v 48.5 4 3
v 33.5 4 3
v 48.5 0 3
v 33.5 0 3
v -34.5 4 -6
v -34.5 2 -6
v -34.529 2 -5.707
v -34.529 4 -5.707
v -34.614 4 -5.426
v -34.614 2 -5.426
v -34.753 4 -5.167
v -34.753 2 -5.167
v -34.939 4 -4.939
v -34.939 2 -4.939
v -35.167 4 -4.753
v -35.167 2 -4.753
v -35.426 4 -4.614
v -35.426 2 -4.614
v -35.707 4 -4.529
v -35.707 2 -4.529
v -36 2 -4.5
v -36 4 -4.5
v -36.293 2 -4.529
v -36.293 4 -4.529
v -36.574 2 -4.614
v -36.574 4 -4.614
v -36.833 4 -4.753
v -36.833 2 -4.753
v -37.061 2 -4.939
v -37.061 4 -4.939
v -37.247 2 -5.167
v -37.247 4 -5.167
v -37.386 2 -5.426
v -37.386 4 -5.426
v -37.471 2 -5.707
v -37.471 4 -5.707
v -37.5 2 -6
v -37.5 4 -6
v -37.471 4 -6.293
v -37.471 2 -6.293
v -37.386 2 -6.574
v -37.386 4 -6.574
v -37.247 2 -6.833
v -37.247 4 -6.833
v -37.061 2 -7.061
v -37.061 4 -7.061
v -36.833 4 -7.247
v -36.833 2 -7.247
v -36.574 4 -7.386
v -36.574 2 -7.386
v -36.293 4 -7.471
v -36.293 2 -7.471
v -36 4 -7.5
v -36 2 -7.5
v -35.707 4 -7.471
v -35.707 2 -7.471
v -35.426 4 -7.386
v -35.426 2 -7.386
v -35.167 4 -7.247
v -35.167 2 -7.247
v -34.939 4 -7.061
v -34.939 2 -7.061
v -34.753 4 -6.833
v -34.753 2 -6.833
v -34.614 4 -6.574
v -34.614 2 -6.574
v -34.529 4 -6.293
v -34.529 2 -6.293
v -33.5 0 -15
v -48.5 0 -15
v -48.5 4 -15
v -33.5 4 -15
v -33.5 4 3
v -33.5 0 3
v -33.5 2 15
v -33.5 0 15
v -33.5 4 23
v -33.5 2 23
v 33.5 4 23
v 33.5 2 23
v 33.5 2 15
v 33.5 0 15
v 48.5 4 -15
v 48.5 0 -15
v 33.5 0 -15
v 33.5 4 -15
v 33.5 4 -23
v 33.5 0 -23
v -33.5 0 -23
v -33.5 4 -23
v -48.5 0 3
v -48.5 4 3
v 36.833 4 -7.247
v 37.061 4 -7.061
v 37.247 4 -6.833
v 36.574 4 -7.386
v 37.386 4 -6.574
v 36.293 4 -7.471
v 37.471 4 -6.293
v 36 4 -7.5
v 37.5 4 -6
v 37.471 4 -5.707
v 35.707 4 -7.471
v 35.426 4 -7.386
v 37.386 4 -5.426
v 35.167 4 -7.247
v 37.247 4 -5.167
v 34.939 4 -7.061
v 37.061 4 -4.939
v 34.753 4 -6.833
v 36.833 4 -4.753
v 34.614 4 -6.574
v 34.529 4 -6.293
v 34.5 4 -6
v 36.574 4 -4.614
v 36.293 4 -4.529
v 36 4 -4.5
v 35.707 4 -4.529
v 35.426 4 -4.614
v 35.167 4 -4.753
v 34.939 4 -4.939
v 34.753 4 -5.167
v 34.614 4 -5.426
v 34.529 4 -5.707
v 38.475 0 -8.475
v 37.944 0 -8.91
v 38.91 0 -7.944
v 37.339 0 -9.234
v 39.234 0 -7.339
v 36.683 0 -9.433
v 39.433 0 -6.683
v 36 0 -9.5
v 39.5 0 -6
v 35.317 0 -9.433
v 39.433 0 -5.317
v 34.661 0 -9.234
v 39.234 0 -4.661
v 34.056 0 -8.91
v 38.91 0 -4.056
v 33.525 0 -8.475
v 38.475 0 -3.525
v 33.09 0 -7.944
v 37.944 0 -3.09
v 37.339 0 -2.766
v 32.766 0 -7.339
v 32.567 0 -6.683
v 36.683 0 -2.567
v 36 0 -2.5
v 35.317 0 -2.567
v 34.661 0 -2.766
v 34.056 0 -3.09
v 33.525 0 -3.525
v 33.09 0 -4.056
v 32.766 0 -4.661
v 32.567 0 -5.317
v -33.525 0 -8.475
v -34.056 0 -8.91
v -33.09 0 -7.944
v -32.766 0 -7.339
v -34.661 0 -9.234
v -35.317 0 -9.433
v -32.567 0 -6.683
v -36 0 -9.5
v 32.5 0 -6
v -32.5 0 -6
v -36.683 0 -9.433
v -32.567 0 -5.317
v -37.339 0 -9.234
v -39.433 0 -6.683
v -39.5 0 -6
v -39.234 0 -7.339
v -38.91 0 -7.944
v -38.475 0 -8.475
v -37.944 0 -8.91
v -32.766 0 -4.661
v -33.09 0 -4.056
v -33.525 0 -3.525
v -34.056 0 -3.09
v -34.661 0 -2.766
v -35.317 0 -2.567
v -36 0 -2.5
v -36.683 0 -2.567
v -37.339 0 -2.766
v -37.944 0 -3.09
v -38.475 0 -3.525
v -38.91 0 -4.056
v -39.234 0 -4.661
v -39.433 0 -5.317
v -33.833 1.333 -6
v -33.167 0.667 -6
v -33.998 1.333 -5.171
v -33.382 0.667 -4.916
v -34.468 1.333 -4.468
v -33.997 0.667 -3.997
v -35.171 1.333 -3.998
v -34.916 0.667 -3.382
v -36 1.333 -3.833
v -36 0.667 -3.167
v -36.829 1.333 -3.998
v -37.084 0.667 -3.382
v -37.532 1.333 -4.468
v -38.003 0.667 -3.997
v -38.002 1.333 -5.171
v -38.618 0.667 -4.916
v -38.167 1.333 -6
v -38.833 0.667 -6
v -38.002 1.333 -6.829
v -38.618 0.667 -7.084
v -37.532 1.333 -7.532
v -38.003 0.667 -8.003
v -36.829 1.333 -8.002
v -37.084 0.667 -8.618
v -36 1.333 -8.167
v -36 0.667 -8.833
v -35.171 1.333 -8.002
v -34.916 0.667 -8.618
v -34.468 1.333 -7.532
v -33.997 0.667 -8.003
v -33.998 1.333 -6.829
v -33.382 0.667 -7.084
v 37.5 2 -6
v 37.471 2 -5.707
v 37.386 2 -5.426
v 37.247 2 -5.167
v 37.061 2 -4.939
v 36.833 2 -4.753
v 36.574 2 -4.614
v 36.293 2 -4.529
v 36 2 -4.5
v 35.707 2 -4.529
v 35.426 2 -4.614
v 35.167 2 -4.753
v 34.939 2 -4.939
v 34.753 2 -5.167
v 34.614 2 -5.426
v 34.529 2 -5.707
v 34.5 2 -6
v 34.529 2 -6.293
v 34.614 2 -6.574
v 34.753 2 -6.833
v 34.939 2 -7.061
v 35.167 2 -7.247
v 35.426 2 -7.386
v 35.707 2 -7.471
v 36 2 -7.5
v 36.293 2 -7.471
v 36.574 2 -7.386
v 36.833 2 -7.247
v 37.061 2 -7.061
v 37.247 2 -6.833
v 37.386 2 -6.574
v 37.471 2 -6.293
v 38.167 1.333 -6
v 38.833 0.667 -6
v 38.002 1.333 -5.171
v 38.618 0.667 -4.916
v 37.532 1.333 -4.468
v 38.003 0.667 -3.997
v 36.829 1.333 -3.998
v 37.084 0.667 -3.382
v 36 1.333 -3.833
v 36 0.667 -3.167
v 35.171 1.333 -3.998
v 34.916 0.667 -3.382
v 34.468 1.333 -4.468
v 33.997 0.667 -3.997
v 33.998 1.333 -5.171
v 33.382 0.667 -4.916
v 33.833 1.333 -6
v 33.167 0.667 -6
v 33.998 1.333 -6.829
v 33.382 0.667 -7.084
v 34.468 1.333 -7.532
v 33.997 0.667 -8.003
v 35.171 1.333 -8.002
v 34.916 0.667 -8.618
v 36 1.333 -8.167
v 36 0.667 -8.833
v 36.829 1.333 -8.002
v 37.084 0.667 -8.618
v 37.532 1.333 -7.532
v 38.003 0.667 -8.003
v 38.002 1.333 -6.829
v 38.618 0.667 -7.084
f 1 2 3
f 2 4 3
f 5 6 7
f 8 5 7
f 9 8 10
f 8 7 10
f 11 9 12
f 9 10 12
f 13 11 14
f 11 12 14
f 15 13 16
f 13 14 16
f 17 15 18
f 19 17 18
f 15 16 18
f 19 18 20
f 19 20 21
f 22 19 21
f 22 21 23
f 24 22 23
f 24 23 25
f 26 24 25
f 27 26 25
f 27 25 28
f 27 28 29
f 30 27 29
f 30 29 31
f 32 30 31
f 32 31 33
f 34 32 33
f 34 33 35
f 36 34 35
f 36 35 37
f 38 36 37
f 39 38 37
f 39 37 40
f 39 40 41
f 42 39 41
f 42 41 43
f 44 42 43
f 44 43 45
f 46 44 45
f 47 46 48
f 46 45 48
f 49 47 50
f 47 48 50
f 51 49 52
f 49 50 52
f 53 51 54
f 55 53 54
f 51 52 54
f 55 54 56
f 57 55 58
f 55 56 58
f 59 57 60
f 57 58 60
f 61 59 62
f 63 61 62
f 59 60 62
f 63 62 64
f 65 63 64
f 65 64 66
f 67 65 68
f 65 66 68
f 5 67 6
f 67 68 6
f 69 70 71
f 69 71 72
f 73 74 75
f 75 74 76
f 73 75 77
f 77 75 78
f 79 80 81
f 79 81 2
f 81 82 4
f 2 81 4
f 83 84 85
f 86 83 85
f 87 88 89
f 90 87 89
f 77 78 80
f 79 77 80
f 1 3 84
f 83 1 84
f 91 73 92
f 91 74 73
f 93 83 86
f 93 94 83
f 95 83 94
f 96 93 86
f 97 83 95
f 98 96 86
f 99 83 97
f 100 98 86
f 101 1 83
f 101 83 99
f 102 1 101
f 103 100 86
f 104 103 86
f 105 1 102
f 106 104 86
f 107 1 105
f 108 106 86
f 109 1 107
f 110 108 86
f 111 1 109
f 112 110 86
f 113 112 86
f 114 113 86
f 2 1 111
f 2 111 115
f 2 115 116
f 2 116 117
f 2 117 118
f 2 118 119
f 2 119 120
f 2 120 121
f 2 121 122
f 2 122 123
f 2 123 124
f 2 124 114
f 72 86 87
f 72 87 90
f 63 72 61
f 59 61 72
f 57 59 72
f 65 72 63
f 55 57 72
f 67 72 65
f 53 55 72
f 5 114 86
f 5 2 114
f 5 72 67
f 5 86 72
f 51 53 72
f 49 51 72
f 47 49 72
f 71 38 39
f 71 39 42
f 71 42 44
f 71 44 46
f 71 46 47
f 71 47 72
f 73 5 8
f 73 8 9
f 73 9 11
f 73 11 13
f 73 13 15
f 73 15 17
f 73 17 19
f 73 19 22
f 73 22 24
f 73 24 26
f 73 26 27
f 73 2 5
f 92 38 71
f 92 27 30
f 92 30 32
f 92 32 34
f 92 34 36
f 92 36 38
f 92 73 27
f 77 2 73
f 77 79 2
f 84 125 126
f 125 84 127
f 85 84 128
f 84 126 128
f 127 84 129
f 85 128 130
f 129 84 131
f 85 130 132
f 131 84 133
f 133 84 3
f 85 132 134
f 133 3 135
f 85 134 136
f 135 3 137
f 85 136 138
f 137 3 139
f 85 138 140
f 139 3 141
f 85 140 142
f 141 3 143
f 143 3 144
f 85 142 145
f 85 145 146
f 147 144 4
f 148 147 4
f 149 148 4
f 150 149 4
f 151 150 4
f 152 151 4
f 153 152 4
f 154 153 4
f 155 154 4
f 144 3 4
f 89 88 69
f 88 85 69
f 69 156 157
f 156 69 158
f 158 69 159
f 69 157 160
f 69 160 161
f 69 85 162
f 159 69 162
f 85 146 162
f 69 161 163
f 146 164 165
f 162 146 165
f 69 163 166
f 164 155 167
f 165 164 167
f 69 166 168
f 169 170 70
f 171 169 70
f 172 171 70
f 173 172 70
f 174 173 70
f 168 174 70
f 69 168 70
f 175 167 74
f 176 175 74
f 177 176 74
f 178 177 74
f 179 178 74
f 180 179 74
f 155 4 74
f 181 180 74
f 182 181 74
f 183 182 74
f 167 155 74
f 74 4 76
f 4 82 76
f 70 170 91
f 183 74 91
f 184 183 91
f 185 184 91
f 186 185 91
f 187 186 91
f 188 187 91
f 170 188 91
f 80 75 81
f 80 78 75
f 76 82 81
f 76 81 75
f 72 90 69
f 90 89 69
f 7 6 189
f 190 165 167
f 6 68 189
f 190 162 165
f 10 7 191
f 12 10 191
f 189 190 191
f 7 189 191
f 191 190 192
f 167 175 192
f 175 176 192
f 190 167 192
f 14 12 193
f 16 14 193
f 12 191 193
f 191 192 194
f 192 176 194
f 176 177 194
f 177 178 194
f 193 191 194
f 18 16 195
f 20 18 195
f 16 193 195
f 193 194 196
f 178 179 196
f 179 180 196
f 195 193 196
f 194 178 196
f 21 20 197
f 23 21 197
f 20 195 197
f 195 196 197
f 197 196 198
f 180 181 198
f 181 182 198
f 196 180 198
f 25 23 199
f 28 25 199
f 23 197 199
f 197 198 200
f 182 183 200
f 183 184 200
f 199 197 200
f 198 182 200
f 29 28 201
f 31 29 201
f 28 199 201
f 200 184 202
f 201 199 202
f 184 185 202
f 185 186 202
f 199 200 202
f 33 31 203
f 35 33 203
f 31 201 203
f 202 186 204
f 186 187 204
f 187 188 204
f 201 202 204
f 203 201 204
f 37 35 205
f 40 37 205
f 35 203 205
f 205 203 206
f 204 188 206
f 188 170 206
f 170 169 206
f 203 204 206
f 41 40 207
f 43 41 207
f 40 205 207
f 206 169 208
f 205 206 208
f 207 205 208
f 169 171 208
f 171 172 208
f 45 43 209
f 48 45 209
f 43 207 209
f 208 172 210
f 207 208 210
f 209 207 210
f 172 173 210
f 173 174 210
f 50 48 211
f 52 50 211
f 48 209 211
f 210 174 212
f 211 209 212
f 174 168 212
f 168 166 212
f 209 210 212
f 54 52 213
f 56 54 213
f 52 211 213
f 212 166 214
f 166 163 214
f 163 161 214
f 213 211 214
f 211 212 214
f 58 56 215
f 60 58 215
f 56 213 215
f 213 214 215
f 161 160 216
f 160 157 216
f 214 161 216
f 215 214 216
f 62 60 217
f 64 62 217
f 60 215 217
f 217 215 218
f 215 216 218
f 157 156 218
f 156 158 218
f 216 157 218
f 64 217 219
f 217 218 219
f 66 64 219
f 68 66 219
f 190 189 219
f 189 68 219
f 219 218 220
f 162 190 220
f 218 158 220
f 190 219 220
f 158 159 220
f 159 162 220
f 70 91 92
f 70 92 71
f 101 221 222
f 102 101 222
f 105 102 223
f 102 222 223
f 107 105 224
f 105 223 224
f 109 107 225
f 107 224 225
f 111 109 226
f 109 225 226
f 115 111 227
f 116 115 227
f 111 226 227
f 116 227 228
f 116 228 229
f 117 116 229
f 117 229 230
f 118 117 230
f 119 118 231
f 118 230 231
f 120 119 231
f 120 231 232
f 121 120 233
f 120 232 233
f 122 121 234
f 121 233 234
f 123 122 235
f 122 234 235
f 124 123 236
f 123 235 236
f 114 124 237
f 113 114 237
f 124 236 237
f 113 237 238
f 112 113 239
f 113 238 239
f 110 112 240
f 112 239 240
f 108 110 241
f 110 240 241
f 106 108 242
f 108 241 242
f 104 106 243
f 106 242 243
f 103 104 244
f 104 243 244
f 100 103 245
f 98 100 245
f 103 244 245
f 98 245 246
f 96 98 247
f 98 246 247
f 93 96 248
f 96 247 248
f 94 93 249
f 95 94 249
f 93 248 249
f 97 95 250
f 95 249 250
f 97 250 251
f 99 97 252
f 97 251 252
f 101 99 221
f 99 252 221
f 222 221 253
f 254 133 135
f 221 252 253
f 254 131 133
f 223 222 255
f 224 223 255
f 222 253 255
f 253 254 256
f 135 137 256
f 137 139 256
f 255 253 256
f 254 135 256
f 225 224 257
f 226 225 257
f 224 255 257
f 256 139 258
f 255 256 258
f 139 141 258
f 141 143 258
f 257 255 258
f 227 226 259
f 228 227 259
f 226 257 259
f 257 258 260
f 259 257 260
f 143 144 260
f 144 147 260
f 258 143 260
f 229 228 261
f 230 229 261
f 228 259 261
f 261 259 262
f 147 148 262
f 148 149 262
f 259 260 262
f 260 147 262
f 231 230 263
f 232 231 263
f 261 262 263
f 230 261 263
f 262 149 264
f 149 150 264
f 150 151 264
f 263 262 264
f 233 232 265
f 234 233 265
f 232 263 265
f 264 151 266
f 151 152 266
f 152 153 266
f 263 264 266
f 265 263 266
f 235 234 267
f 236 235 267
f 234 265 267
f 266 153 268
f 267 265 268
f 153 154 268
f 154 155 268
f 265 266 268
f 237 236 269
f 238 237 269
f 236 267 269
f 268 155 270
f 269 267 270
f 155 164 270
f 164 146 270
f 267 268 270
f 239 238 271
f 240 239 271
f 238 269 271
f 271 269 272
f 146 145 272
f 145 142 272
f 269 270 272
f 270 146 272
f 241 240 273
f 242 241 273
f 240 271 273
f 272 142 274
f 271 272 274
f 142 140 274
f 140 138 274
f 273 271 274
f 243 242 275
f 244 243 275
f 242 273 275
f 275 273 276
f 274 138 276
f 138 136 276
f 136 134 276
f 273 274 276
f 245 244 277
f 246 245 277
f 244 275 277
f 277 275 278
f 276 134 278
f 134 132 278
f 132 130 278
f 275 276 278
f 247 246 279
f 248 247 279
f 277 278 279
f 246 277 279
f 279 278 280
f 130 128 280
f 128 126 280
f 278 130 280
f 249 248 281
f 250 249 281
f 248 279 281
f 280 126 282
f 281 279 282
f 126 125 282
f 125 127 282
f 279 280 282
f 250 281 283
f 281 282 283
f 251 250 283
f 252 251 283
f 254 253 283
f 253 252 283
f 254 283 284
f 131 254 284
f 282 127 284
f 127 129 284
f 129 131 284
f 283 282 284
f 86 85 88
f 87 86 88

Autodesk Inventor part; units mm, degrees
ref_plane "YZ Plane" through (0, 0, 0) normal (1, 0, 0) x (0, 1, 0)
ref_plane "XZ Plane" through (0, 0, 0) normal (0, 1, 0) x (-1, 0, 0)
ref_plane "XY Plane" through (0, 0, 0) normal (0, 0, 1) x (1, 0, 0)
sketch "Sketch1" plane through (0, 0, 0) normal (0, 1, 0) x (-1, 0, 0)
  line L0 (-33.5, -23) -> (33.5, -23)
  line L1 (33.5, -23) -> (33.5, 23)
  line L2 (33.5, 23) -> (-33.5, 23)
  line L3 (-33.5, 23) -> (-33.5, -23)
  line L4 (-33.5, -23) -> (33.5, 23) construction
  line L5 (33.5, -23) -> (-33.5, 23) construction
  line L6 (33.5, 3) -> (48.5, 3)
  line L7 (48.5, 3) -> (48.5, -15)
  line L8 (48.5, -15) -> (33.5, -15)
  line L9 (33.5, -15) -> (33.5, 3)
  line L10 (-33.5, 3) -> (-48.5, 3)
  line L11 (-48.5, 3) -> (-48.5, -15)
  line L12 (-48.5, -15) -> (-33.5, -15)
  line L13 (-33.5, -15) -> (-33.5, 3)
  point P0 (0, 0)
  point P1 (-33.5, 3)
  dimension "d0" = 67
  dimension "d1" = 46
  dimension "d2" = 97
  dimension "d5" = 8
  dimension "d6" = 18
extrude "Extrusion1" add sketch "Sketch1" along normal blind 4
sketch "Sketch2" plane through (0, 0, 0) normal (0, -1, 0) x (1, 0, 0)
  line L0 (-33.5, 23) -> (33.5, 23) projected
  line L1 (33.5, 23) -> (33.5, 3) projected
  line L2 (-33.5, 23) -> (33.5, 23)
  line L3 (33.5, 23) -> (33.5, 15)
  line L4 (33.5, 15) -> (-33.5, 15)
  line L5 (-33.5, 15) -> (-33.5, 23)
  point P0 (0, 0)
  dimension "d7" = 8
extrude "Extrusion2" cut sketch "Sketch2" against normal blind 2
sketch "Sketch3" plane through (0, 0, 0) normal (0, -1, 0) x (1, 0, 0)
  circle A0 centre (-36, -6) radius 1.5
  circle A1 centre (36, -6) radius 1.5
  line L0 (48.5, -15) -> (33.5, -15) projected
  line L1 (48.5, 3) -> (48.5, -15) projected
  line L2 (-48.5, -15) -> (-48.5, 3) projected
  line L3 (-33.5, -15) -> (-48.5, -15) projected
  point P0 (0, 0)
  dimension "d10" = 9
  dimension "d11" = 12.5
  dimension "d12" = 12.5
  dimension "d13" = 9
  dimension "d14" = 3
extrude "Extrusion3" cut sketch "Sketch3" against normal through all
chamfer "Chamfer1" distance 2 angle 45 2 edges at (34.5, 0, -6) (-37.5, 0, -6)
properties part number "WeightBack" material "Lead"
